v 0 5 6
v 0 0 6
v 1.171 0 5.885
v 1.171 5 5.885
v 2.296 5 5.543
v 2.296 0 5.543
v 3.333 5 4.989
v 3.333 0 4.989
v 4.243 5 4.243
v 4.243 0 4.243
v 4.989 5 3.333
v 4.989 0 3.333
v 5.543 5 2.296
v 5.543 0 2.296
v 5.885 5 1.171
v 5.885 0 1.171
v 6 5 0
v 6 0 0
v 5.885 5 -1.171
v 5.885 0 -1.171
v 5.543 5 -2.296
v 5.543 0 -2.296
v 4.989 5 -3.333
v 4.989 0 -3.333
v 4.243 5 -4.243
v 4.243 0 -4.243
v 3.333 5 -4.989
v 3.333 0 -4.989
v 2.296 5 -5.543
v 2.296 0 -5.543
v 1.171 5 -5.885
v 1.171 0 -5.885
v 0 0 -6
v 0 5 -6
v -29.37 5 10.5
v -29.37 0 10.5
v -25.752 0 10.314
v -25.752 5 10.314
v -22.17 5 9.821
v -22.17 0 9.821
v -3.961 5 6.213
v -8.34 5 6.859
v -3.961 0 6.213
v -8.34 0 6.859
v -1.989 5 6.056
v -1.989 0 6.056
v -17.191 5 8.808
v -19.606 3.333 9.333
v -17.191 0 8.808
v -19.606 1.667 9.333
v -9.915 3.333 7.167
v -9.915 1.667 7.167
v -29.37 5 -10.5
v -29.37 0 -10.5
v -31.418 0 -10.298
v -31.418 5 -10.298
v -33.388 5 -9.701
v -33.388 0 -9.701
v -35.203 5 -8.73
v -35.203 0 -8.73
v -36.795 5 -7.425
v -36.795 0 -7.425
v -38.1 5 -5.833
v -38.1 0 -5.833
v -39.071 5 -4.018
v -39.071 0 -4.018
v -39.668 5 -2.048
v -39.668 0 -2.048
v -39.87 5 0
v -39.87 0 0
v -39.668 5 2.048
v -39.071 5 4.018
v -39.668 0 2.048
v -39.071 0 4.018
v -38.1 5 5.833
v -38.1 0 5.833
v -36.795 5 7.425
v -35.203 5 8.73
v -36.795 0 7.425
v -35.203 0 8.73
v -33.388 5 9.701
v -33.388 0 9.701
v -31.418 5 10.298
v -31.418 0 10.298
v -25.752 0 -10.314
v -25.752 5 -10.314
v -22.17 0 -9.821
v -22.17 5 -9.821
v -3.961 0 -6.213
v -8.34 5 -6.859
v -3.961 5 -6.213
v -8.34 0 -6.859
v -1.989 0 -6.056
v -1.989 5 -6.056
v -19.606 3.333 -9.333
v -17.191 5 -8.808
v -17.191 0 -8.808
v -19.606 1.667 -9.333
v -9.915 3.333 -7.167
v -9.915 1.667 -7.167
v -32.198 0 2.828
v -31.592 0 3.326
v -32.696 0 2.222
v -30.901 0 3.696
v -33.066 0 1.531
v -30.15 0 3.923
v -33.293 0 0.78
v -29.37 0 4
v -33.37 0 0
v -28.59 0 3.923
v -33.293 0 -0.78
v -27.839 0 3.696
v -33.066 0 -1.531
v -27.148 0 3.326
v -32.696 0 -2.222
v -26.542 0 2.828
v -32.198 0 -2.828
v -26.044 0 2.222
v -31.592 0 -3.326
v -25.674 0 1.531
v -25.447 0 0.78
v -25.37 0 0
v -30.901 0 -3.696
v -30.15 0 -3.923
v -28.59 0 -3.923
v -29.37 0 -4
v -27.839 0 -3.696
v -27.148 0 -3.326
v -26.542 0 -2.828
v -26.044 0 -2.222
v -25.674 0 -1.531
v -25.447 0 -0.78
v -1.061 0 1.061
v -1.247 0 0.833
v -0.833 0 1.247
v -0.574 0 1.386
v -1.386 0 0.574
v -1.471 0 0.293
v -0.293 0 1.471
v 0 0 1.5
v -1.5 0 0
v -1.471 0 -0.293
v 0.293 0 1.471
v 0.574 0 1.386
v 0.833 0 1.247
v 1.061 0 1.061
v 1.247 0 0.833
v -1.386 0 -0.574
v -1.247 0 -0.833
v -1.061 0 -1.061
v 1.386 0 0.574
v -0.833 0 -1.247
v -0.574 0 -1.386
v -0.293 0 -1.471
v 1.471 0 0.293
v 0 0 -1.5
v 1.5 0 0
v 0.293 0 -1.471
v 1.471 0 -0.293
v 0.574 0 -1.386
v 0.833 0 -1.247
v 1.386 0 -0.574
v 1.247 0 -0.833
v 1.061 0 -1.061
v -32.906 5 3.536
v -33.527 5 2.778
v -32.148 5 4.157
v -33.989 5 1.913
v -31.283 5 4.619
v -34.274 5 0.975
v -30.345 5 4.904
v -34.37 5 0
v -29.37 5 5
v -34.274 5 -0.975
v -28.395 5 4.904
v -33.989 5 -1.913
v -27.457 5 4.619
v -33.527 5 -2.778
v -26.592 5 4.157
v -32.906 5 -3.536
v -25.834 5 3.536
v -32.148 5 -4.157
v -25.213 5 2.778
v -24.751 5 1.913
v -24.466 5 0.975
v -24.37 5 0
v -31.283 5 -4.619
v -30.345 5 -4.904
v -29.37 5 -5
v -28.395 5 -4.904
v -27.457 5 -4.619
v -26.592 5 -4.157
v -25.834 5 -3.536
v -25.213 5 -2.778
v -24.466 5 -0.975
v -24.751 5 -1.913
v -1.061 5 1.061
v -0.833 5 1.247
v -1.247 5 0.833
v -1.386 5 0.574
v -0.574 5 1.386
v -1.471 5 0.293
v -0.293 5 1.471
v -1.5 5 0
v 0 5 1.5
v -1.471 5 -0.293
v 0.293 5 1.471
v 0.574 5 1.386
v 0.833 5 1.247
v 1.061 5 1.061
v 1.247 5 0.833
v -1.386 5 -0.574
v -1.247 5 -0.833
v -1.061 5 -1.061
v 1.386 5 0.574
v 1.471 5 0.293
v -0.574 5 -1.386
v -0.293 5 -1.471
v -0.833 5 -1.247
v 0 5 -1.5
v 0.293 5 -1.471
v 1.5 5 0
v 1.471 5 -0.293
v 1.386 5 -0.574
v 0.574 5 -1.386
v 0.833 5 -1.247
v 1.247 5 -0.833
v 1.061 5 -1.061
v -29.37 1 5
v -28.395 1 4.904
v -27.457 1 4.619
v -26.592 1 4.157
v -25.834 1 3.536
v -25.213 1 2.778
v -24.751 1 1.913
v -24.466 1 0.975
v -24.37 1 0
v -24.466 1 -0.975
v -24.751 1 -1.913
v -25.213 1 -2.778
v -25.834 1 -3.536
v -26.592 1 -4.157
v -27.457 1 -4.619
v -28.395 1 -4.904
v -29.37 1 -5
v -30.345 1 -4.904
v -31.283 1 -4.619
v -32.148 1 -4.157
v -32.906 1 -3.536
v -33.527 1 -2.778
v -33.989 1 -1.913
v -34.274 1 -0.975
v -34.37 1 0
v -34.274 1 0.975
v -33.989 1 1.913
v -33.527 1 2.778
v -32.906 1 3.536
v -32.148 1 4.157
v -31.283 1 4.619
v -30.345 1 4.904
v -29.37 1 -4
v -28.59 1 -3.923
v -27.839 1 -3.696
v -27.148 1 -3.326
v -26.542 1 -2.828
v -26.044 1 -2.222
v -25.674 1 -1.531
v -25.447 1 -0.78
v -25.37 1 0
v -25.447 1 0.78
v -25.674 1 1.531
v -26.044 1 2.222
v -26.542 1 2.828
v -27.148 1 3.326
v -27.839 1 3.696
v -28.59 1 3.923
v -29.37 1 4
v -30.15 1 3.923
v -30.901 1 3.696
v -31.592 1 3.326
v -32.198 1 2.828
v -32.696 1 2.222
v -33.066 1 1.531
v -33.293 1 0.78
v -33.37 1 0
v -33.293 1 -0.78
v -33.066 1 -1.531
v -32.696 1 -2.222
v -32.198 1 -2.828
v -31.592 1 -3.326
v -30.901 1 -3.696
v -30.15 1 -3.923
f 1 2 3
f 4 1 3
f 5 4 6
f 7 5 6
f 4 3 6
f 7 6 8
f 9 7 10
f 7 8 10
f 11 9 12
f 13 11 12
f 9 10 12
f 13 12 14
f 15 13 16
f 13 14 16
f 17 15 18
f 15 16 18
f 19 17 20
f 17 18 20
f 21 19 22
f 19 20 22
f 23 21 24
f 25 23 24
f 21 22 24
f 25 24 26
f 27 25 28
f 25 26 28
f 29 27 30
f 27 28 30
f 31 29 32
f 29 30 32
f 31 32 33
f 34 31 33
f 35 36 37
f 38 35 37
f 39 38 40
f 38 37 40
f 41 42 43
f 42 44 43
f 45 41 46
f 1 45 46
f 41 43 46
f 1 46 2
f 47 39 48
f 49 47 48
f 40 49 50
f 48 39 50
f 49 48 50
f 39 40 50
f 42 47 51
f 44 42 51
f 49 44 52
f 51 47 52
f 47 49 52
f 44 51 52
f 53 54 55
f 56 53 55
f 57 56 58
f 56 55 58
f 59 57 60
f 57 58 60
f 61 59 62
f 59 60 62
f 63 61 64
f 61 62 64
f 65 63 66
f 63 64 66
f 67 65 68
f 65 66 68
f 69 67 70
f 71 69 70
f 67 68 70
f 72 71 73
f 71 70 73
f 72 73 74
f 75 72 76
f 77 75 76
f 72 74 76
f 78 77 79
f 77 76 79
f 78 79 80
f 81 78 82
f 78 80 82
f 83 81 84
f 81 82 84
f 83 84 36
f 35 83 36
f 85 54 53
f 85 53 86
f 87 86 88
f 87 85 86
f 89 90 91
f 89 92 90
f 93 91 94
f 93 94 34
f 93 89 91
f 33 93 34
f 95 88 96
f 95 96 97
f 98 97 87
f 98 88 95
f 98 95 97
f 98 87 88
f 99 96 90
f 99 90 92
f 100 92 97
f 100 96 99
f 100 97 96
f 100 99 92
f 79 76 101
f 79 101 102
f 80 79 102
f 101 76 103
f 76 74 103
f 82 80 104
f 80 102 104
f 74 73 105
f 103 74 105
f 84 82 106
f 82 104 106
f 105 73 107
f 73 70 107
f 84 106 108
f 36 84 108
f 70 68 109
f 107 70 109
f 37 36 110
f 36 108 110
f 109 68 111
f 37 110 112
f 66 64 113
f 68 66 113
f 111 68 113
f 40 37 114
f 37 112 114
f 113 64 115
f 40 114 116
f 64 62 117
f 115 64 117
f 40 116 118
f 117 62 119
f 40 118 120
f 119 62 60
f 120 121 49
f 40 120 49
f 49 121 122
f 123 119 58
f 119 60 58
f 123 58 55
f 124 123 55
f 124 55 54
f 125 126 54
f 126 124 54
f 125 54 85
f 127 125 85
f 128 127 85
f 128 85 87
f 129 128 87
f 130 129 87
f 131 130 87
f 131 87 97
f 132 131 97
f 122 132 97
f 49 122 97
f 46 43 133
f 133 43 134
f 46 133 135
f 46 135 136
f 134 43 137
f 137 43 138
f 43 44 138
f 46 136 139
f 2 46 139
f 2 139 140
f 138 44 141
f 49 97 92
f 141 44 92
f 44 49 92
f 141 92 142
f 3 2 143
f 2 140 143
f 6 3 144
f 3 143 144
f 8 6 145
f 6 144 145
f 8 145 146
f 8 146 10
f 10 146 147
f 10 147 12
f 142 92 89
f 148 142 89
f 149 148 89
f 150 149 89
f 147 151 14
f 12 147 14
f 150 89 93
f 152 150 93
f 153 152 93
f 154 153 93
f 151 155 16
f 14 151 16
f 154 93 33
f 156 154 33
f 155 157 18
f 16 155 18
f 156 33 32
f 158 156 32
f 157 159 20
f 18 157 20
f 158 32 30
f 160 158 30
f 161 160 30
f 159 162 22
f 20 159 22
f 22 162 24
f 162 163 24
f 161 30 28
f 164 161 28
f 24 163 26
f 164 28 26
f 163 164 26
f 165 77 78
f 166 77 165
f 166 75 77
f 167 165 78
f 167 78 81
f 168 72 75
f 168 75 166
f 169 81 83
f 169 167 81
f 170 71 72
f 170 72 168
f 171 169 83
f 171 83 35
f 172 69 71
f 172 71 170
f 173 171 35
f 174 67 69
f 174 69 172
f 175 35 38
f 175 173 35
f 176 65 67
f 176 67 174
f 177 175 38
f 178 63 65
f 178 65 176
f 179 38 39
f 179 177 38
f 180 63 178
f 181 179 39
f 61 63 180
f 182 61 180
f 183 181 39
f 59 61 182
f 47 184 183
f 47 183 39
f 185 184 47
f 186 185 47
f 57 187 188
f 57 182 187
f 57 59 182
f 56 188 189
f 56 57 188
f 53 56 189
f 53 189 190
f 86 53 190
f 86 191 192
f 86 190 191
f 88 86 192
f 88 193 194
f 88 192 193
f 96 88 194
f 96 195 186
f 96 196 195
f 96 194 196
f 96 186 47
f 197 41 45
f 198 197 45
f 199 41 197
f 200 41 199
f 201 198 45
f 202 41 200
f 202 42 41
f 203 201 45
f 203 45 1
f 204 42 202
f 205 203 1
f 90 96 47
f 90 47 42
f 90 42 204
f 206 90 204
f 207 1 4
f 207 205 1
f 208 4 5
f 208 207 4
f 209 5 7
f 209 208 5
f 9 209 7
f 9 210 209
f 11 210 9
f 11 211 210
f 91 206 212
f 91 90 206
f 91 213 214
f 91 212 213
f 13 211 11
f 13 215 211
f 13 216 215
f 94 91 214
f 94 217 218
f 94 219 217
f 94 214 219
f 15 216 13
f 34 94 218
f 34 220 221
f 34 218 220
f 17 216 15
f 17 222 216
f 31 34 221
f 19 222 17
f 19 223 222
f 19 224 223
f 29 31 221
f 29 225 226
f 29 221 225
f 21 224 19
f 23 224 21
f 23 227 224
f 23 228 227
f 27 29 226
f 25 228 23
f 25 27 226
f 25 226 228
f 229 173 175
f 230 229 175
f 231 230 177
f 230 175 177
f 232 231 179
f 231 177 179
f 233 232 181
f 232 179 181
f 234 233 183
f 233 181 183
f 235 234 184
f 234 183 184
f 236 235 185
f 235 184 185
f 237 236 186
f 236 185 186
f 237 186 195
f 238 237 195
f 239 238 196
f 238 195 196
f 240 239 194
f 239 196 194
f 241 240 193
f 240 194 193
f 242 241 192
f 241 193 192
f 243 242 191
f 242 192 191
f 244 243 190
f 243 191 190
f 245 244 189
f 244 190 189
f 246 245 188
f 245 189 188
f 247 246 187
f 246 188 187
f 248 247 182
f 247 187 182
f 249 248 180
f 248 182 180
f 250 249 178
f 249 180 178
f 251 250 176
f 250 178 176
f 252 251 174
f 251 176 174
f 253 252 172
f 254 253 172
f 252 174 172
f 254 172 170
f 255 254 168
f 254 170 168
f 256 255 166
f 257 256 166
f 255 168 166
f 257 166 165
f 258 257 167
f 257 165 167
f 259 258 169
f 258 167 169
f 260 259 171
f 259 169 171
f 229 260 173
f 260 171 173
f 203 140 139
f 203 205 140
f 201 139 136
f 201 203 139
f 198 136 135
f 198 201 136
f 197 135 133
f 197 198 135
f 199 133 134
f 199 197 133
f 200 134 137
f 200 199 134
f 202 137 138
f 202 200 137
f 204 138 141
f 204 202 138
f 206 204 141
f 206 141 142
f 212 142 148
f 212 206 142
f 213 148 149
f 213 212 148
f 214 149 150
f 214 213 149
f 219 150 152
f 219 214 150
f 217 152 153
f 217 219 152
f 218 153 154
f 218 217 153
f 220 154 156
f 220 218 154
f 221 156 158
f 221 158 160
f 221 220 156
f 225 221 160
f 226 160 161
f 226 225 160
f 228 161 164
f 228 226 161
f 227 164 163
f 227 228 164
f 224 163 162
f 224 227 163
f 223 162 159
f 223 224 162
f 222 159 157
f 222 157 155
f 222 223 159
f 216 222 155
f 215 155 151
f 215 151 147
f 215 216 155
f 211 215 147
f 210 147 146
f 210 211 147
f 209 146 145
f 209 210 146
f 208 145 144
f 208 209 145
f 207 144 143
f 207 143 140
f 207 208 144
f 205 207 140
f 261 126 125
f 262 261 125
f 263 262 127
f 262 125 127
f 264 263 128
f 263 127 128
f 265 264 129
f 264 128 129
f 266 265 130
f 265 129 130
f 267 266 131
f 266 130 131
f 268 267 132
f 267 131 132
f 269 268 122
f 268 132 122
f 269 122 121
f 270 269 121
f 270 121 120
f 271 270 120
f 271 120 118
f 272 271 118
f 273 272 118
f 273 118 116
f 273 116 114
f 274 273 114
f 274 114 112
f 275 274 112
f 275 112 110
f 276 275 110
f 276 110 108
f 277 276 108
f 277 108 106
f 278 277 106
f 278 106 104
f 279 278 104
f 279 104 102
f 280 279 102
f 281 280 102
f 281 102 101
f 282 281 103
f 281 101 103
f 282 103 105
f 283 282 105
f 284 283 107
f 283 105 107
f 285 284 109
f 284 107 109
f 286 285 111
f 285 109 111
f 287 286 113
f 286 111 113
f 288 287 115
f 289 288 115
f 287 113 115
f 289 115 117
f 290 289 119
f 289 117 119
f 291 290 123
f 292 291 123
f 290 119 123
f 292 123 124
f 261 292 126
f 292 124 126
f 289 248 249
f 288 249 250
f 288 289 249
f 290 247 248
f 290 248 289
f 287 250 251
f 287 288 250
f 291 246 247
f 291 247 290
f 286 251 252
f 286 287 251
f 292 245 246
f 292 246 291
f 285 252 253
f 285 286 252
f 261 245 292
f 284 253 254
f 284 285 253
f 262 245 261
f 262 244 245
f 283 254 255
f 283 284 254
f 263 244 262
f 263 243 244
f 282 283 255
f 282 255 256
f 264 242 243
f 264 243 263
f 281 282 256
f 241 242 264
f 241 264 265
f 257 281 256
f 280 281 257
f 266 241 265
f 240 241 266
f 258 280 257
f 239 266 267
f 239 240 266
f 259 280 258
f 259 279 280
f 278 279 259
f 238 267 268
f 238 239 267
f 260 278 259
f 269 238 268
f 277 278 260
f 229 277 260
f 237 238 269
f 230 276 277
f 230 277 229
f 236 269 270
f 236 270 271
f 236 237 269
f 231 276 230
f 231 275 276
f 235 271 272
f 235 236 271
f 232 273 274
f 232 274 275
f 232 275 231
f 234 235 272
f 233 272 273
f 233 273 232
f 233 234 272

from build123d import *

# Parameters (mm, degrees)
BOSS_EXTRUDE1_DEPTH = 5
SKETCH2_R           = 1.5
SKETCH2_R_2         = 5
CUT_EXTRUDE1_DEPTH  = 4
SKETCH3_R           = 4
CUT_EXTRUDE2_DEPTH  = 10
CUT_EXTRUDE3_START  = -10
SKETCH4_R           = 1.5
CUT_EXTRUDE3_DEPTH  = 10


with BuildPart() as part:
    # Sketch1 → Boss-Extrude1 (new body)
    with BuildSketch(Plane(origin=(0, 0, 0), x_dir=(1, 0, 0), z_dir=(0, 1, 0))):
        with BuildLine():
            ThreePointArc((0, -6), (6, 0), (0, 6))
            add(Edge.make_bspline(
                [(-29.37, 10.5), (-19.469048306, 10.5), (-10.126942608, 6), (0, 6)],
                knots=[0, 0, 0, 0, 1, 1, 1, 1], degree=3))
            ThreePointArc((-29.37, 10.5), (-39.87, 0), (-29.37, -10.5))
            add(Edge.make_bspline(
                [(-29.37, -10.5), (-19.469048306, -10.5), (-10.126942608, -6), (0, -6)],
                knots=[0, 0, 0, 0, 1, 1, 1, 1], degree=3))
        make_face()
    extrude(amount=BOSS_EXTRUDE1_DEPTH)

    # Sketch2 → Cut-Extrude1 (cut)
    with BuildSketch(Plane(origin=(0, 5, 0), x_dir=(1, 0, 0), z_dir=(0, 1, 0))):
        with Locations(Location((0, 0, 0), (0, 0, 270))):
            Circle(SKETCH2_R)
        with Locations(Location((-29.37, 0, 0), (0, 0, 270))):
            Circle(SKETCH2_R_2)
    extrude(amount=-CUT_EXTRUDE1_DEPTH, mode=Mode.SUBTRACT)

    # Sketch3 → Cut-Extrude2 (cut)
    with BuildSketch(Plane.XZ):
        with Locations(Location((-29.37, 0, 0), (0, 0, 270))):
            Circle(SKETCH3_R)
    extrude(amount=-CUT_EXTRUDE2_DEPTH, mode=Mode.SUBTRACT)

    # Sketch4 → Cut-Extrude3 (cut)
    with BuildSketch(Plane.XZ.offset(CUT_EXTRUDE3_START)):
        with Locations(Location((0, 0, 0), (0, 0, 90))):
            Circle(SKETCH4_R)
    extrude(amount=CUT_EXTRUDE3_DEPTH, mode=Mode.SUBTRACT)


solid = part.part
